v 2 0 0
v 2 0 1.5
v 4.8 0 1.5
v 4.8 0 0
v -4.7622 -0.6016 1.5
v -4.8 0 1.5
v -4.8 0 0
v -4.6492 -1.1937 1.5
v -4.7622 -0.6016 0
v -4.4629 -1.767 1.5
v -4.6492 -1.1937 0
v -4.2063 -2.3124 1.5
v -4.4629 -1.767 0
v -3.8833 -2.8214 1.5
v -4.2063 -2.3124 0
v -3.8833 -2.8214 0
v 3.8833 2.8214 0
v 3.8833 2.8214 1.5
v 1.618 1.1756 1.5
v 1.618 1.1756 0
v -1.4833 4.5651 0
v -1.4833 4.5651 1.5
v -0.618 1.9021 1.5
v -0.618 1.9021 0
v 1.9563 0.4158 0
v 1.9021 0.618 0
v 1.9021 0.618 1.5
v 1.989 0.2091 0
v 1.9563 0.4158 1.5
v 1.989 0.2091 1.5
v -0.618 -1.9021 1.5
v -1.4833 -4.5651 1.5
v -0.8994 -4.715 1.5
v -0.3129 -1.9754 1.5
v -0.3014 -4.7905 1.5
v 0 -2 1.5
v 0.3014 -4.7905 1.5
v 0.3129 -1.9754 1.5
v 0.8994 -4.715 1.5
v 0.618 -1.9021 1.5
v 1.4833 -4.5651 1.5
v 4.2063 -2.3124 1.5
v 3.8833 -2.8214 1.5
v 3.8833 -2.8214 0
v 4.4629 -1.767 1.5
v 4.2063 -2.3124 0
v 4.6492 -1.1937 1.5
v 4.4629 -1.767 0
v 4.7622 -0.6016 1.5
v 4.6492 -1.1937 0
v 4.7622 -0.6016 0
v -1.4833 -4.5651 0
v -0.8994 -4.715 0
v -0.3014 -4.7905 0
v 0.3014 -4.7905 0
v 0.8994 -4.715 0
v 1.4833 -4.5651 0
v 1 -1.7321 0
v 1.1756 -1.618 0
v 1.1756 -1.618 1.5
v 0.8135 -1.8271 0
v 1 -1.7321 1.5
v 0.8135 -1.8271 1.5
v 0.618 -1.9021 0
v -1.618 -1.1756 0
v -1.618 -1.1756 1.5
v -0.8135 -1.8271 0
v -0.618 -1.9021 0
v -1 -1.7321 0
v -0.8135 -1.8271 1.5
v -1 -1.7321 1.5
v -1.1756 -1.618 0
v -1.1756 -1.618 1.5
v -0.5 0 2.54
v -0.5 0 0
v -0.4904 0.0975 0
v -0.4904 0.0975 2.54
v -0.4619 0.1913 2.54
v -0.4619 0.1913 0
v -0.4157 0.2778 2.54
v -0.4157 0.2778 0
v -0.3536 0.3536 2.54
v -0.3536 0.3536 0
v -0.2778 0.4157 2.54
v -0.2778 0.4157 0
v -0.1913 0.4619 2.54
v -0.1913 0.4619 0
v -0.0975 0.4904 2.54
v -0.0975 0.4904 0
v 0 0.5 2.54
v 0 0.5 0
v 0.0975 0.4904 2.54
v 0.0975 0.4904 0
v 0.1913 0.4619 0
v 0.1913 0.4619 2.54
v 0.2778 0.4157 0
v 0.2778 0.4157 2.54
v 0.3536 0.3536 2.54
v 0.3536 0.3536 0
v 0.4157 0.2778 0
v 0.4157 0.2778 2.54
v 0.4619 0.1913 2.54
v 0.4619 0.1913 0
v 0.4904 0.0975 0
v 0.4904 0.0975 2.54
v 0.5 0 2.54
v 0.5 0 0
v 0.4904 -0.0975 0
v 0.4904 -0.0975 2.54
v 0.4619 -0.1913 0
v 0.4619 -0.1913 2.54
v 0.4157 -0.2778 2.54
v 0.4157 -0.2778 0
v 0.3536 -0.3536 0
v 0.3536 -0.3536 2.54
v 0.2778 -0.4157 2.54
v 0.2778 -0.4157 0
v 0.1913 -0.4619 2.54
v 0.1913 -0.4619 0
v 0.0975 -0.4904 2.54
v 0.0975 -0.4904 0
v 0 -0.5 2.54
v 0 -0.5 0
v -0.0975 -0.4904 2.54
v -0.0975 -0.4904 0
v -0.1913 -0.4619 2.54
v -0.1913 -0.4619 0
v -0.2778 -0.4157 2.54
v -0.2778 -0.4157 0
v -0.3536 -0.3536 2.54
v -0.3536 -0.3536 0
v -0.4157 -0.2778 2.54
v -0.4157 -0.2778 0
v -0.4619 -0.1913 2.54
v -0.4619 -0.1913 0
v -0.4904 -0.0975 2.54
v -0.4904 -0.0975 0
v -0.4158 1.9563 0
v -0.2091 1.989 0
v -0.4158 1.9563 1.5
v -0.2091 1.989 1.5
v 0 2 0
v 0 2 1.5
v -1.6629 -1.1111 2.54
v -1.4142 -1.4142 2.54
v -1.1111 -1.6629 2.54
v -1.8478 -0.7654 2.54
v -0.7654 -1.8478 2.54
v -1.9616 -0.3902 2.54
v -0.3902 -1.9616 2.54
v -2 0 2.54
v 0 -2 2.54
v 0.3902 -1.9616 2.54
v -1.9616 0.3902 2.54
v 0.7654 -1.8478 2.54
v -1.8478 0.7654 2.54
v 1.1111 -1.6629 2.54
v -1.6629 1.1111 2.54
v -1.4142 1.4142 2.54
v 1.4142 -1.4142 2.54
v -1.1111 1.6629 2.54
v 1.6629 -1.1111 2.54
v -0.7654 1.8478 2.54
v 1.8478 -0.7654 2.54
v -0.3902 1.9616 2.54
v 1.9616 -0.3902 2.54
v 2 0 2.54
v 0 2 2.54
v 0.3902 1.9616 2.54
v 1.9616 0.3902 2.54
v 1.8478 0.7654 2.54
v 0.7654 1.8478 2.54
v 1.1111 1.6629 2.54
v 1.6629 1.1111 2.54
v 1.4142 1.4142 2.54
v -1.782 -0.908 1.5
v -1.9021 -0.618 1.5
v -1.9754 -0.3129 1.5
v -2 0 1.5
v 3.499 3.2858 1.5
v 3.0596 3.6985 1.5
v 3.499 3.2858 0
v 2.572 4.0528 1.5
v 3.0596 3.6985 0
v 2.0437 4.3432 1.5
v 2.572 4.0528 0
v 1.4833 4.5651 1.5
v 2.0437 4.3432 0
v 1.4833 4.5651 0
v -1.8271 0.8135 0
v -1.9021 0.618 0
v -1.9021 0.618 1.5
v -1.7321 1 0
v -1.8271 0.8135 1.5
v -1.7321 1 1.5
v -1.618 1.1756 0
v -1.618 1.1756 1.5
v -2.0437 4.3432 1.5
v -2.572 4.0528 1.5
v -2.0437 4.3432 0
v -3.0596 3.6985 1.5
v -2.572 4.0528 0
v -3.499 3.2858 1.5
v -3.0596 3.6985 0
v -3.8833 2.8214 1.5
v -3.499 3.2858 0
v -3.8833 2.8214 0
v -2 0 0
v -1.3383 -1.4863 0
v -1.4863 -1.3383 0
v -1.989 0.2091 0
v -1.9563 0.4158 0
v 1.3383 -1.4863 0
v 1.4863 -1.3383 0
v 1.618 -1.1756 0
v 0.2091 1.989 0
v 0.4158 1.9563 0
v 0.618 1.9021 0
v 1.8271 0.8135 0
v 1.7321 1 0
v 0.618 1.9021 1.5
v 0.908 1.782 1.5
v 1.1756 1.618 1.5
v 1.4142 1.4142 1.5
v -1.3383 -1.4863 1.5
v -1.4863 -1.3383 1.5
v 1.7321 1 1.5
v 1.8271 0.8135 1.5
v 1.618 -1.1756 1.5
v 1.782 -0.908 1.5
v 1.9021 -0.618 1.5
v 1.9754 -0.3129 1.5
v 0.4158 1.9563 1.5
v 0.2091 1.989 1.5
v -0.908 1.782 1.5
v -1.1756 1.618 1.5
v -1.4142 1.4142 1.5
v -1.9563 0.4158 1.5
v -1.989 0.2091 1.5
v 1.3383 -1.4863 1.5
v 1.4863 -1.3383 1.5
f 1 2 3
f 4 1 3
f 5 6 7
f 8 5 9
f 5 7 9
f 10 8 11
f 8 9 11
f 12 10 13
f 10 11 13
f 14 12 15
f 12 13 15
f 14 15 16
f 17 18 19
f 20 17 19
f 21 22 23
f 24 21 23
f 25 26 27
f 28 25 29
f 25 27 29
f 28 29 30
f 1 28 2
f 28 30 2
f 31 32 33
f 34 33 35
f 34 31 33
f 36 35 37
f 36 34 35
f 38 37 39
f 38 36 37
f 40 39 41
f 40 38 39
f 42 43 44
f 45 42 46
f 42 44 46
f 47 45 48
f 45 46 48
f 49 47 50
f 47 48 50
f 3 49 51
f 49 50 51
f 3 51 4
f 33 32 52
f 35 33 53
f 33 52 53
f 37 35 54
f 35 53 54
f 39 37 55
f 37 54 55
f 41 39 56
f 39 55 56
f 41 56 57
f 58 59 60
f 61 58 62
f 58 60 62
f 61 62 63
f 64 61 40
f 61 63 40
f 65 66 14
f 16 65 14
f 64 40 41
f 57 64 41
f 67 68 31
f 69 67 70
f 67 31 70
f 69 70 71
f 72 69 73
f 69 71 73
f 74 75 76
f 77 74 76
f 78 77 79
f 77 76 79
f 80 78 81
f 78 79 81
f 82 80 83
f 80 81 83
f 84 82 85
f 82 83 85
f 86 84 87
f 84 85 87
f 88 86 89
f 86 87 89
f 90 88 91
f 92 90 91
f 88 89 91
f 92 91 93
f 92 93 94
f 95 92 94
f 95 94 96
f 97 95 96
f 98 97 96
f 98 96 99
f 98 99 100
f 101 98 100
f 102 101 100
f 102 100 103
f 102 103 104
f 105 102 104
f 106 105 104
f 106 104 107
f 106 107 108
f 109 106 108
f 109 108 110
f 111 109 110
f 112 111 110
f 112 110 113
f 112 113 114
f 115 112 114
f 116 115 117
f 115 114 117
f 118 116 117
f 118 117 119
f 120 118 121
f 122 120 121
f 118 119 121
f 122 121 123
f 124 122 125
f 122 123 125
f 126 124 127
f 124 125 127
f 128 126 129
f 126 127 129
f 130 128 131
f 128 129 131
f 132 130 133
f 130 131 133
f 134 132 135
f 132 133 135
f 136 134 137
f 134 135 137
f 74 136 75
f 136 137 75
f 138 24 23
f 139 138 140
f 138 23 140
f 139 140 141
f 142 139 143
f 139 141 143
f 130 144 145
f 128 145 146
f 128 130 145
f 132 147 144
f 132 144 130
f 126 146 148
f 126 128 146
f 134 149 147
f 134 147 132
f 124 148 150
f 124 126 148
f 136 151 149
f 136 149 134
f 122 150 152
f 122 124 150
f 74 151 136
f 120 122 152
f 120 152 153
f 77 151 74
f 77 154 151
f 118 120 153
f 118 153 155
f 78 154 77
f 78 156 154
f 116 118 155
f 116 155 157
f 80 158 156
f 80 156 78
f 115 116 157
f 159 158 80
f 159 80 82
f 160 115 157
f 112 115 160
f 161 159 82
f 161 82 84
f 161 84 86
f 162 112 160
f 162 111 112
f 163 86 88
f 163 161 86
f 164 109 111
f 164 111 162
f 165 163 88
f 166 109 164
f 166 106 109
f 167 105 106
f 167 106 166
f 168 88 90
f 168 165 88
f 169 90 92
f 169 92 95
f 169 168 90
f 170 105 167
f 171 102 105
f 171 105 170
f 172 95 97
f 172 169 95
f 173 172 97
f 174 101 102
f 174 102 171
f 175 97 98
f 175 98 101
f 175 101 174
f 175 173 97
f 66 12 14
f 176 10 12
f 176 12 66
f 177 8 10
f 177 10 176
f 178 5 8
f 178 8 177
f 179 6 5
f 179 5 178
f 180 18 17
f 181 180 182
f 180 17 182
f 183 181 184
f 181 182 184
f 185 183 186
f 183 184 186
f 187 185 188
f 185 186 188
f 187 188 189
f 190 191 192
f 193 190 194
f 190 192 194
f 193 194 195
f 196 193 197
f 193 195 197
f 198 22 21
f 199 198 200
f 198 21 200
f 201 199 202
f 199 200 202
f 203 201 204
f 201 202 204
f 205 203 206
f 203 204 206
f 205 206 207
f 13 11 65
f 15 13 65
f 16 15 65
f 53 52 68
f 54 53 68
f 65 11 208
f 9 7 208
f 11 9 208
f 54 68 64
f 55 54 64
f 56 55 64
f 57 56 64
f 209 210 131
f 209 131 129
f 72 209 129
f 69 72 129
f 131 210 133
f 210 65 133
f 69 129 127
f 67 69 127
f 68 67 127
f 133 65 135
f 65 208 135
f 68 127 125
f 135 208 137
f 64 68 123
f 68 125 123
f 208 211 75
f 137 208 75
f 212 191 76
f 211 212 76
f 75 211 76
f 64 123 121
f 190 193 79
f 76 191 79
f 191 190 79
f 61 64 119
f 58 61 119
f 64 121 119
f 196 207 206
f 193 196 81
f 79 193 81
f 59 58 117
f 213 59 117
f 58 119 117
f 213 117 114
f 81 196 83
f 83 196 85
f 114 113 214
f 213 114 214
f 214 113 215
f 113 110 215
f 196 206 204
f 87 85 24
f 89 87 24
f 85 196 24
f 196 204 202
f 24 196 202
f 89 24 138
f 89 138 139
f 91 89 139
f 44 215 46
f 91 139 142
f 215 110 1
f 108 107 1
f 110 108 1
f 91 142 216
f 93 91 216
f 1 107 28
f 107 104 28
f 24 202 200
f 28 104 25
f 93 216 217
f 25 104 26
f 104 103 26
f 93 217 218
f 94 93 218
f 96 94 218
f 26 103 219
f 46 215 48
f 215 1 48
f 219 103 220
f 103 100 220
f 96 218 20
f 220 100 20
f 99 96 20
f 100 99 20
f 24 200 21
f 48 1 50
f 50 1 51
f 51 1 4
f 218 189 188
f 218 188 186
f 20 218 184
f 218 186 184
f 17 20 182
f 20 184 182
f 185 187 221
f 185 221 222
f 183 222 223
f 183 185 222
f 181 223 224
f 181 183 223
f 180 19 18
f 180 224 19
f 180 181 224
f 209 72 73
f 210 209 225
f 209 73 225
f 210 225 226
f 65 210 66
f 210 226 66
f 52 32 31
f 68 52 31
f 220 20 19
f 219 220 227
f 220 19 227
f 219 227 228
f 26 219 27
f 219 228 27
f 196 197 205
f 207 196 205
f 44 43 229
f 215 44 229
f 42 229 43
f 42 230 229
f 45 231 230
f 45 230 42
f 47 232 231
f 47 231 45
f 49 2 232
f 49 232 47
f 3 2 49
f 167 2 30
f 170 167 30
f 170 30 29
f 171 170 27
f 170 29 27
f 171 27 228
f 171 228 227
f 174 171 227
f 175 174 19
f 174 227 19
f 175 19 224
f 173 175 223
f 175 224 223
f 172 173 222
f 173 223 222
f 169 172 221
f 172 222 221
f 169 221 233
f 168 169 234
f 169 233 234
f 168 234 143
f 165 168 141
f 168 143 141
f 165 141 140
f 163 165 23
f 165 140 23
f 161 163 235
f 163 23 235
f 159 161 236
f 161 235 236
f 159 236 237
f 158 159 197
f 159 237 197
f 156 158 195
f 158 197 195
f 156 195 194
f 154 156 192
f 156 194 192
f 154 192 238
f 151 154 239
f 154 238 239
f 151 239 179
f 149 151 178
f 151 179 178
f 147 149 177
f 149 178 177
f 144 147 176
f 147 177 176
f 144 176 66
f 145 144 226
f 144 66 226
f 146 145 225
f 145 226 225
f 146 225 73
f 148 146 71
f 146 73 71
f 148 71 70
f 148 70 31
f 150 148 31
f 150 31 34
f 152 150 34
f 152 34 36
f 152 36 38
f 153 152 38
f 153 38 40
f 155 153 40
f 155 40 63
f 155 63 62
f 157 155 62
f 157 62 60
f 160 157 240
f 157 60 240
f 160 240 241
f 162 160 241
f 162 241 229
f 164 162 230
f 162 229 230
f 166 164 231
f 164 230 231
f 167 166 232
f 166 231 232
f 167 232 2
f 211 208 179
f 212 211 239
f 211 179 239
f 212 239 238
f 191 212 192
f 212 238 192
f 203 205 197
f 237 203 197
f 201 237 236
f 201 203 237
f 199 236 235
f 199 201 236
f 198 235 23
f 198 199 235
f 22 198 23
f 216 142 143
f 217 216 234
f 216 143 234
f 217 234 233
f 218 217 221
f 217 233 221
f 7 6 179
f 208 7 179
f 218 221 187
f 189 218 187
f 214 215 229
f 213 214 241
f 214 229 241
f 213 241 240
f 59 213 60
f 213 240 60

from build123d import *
from build123d.topology import SkipClean

# Parameters (mm, degrees)
SZKIC1_R                    = 4.8
DODANIE_WYCI_GNI_CIE1_DEPTH = 1.5
SZKIC2_R                    = 2
DODANIE_WYCI_GNI_CIE2_DEPTH = 1.5
WYTNIJ_WYCI_GNI_CIE1_REACH  = 8.952
SZYK_KO_OWY2_COUNT          = 5
OTW_R1_D                    = 1
ESBO_O1_R                   = 2
CORTE_EXTRUS_O1_DEPTH       = 0.46


with BuildPart() as part:
    # Szkic1 → Dodanie-wyciągnięcie1 (new body)
    with BuildSketch(Plane.XY):
        Circle(SZKIC1_R)
    extrude(amount=DODANIE_WYCI_GNI_CIE1_DEPTH)

    # Szkic2 → Dodanie-wyciągnięcie2 (add)
    with BuildSketch(Plane.XY.offset(1.5)):
        Circle(SZKIC2_R)
    extrude(amount=DODANIE_WYCI_GNI_CIE2_DEPTH)

    # Szkic3 → Wytnij-wyciągnięcie1 (cut, up to next)
    with BuildSketch(Plane.XY.offset(1.5), mode=Mode.PRIVATE) as wytnij_wyci_gni_cie1_sk1:
        with BuildLine():
            ThreePointArc((-0.618033989, 1.902113033), (-0.31286893, 1.975376681), (0, 2))
            Line((0, 2), (0, 4.8))
            ThreePointArc((0, 4.8), (-0.750885432, 4.740904035), (-1.483281573, 4.565071278))
            Line((-1.483281573, 4.565071278), (-0.618033989, 1.902113033))
        make_face()
    wytnij_wyci_gni_cie1_tool1 = extrude(wytnij_wyci_gni_cie1_sk1.sketch, amount=-WYTNIJ_WYCI_GNI_CIE1_REACH, mode=Mode.PRIVATE) & part.part
    # Szkic3 → Wytnij-wyciągnięcie1 (cut, up to next)
    with BuildSketch(Plane.XY.offset(1.5), mode=Mode.PRIVATE) as wytnij_wyci_gni_cie1_sk2:
        with BuildLine():
            Line((0, 4.8), (0, 2))
            ThreePointArc((0, 2), (0.31286893, 1.975376681), (0.618033989, 1.902113033))
            Line((0.618033989, 1.902113033), (1.483281573, 4.565071278))
            ThreePointArc((1.483281573, 4.565071278), (0.750885432, 4.740904035), (0, 4.8))
        make_face()
    wytnij_wyci_gni_cie1_tool2 = extrude(wytnij_wyci_gni_cie1_sk2.sketch, amount=-WYTNIJ_WYCI_GNI_CIE1_REACH, mode=Mode.PRIVATE) & part.part
    wytnij_wyci_gni_cie1_1 = wytnij_wyci_gni_cie1_tool1.solids().sort_by_distance((-0.559629, 3.533359, 1.5))[0]
    add(wytnij_wyci_gni_cie1_1, mode=Mode.SUBTRACT)
    wytnij_wyci_gni_cie1_2 = wytnij_wyci_gni_cie1_tool2.solids().sort_by_distance((0.559629, 3.533359, 1.5))[0]
    add(wytnij_wyci_gni_cie1_2, mode=Mode.SUBTRACT)
    wytnij_wyci_gni_cie1 = wytnij_wyci_gni_cie1_1 + wytnij_wyci_gni_cie1_2  # Wytnij-wyciągnięcie1 as one shape, for the pattern or mirror that repeats it

    # Szyk kołowy2: Wytnij-wyciągnięcie1 ×5 about axis
    with SkipClean():  # the faces are left unmerged after this step: merging them gives an invalid solid
        szyk_ko_owy2_axis = Axis((0, 0, 0), (0, 0, 1))
        for i in range(1, SZYK_KO_OWY2_COUNT):
            add(wytnij_wyci_gni_cie1.rotate(szyk_ko_owy2_axis, i * 360 / SZYK_KO_OWY2_COUNT), mode=Mode.SUBTRACT)

    # Otwór1 (through all)
    with Locations(Plane.XY.offset(3)):
        with Locations((0, 0)):
            Hole(OTW_R1_D / 2)

    # Esboço1 → Corte-extrusão1 (cut)
    with SkipClean():  # the faces are left unmerged after this step: merging them gives an invalid solid
        with BuildSketch(Plane.XY.offset(3)):
            Circle(ESBO_O1_R)
        extrude(amount=-CORTE_EXTRUS_O1_DEPTH, mode=Mode.SUBTRACT)


solid = part.part
